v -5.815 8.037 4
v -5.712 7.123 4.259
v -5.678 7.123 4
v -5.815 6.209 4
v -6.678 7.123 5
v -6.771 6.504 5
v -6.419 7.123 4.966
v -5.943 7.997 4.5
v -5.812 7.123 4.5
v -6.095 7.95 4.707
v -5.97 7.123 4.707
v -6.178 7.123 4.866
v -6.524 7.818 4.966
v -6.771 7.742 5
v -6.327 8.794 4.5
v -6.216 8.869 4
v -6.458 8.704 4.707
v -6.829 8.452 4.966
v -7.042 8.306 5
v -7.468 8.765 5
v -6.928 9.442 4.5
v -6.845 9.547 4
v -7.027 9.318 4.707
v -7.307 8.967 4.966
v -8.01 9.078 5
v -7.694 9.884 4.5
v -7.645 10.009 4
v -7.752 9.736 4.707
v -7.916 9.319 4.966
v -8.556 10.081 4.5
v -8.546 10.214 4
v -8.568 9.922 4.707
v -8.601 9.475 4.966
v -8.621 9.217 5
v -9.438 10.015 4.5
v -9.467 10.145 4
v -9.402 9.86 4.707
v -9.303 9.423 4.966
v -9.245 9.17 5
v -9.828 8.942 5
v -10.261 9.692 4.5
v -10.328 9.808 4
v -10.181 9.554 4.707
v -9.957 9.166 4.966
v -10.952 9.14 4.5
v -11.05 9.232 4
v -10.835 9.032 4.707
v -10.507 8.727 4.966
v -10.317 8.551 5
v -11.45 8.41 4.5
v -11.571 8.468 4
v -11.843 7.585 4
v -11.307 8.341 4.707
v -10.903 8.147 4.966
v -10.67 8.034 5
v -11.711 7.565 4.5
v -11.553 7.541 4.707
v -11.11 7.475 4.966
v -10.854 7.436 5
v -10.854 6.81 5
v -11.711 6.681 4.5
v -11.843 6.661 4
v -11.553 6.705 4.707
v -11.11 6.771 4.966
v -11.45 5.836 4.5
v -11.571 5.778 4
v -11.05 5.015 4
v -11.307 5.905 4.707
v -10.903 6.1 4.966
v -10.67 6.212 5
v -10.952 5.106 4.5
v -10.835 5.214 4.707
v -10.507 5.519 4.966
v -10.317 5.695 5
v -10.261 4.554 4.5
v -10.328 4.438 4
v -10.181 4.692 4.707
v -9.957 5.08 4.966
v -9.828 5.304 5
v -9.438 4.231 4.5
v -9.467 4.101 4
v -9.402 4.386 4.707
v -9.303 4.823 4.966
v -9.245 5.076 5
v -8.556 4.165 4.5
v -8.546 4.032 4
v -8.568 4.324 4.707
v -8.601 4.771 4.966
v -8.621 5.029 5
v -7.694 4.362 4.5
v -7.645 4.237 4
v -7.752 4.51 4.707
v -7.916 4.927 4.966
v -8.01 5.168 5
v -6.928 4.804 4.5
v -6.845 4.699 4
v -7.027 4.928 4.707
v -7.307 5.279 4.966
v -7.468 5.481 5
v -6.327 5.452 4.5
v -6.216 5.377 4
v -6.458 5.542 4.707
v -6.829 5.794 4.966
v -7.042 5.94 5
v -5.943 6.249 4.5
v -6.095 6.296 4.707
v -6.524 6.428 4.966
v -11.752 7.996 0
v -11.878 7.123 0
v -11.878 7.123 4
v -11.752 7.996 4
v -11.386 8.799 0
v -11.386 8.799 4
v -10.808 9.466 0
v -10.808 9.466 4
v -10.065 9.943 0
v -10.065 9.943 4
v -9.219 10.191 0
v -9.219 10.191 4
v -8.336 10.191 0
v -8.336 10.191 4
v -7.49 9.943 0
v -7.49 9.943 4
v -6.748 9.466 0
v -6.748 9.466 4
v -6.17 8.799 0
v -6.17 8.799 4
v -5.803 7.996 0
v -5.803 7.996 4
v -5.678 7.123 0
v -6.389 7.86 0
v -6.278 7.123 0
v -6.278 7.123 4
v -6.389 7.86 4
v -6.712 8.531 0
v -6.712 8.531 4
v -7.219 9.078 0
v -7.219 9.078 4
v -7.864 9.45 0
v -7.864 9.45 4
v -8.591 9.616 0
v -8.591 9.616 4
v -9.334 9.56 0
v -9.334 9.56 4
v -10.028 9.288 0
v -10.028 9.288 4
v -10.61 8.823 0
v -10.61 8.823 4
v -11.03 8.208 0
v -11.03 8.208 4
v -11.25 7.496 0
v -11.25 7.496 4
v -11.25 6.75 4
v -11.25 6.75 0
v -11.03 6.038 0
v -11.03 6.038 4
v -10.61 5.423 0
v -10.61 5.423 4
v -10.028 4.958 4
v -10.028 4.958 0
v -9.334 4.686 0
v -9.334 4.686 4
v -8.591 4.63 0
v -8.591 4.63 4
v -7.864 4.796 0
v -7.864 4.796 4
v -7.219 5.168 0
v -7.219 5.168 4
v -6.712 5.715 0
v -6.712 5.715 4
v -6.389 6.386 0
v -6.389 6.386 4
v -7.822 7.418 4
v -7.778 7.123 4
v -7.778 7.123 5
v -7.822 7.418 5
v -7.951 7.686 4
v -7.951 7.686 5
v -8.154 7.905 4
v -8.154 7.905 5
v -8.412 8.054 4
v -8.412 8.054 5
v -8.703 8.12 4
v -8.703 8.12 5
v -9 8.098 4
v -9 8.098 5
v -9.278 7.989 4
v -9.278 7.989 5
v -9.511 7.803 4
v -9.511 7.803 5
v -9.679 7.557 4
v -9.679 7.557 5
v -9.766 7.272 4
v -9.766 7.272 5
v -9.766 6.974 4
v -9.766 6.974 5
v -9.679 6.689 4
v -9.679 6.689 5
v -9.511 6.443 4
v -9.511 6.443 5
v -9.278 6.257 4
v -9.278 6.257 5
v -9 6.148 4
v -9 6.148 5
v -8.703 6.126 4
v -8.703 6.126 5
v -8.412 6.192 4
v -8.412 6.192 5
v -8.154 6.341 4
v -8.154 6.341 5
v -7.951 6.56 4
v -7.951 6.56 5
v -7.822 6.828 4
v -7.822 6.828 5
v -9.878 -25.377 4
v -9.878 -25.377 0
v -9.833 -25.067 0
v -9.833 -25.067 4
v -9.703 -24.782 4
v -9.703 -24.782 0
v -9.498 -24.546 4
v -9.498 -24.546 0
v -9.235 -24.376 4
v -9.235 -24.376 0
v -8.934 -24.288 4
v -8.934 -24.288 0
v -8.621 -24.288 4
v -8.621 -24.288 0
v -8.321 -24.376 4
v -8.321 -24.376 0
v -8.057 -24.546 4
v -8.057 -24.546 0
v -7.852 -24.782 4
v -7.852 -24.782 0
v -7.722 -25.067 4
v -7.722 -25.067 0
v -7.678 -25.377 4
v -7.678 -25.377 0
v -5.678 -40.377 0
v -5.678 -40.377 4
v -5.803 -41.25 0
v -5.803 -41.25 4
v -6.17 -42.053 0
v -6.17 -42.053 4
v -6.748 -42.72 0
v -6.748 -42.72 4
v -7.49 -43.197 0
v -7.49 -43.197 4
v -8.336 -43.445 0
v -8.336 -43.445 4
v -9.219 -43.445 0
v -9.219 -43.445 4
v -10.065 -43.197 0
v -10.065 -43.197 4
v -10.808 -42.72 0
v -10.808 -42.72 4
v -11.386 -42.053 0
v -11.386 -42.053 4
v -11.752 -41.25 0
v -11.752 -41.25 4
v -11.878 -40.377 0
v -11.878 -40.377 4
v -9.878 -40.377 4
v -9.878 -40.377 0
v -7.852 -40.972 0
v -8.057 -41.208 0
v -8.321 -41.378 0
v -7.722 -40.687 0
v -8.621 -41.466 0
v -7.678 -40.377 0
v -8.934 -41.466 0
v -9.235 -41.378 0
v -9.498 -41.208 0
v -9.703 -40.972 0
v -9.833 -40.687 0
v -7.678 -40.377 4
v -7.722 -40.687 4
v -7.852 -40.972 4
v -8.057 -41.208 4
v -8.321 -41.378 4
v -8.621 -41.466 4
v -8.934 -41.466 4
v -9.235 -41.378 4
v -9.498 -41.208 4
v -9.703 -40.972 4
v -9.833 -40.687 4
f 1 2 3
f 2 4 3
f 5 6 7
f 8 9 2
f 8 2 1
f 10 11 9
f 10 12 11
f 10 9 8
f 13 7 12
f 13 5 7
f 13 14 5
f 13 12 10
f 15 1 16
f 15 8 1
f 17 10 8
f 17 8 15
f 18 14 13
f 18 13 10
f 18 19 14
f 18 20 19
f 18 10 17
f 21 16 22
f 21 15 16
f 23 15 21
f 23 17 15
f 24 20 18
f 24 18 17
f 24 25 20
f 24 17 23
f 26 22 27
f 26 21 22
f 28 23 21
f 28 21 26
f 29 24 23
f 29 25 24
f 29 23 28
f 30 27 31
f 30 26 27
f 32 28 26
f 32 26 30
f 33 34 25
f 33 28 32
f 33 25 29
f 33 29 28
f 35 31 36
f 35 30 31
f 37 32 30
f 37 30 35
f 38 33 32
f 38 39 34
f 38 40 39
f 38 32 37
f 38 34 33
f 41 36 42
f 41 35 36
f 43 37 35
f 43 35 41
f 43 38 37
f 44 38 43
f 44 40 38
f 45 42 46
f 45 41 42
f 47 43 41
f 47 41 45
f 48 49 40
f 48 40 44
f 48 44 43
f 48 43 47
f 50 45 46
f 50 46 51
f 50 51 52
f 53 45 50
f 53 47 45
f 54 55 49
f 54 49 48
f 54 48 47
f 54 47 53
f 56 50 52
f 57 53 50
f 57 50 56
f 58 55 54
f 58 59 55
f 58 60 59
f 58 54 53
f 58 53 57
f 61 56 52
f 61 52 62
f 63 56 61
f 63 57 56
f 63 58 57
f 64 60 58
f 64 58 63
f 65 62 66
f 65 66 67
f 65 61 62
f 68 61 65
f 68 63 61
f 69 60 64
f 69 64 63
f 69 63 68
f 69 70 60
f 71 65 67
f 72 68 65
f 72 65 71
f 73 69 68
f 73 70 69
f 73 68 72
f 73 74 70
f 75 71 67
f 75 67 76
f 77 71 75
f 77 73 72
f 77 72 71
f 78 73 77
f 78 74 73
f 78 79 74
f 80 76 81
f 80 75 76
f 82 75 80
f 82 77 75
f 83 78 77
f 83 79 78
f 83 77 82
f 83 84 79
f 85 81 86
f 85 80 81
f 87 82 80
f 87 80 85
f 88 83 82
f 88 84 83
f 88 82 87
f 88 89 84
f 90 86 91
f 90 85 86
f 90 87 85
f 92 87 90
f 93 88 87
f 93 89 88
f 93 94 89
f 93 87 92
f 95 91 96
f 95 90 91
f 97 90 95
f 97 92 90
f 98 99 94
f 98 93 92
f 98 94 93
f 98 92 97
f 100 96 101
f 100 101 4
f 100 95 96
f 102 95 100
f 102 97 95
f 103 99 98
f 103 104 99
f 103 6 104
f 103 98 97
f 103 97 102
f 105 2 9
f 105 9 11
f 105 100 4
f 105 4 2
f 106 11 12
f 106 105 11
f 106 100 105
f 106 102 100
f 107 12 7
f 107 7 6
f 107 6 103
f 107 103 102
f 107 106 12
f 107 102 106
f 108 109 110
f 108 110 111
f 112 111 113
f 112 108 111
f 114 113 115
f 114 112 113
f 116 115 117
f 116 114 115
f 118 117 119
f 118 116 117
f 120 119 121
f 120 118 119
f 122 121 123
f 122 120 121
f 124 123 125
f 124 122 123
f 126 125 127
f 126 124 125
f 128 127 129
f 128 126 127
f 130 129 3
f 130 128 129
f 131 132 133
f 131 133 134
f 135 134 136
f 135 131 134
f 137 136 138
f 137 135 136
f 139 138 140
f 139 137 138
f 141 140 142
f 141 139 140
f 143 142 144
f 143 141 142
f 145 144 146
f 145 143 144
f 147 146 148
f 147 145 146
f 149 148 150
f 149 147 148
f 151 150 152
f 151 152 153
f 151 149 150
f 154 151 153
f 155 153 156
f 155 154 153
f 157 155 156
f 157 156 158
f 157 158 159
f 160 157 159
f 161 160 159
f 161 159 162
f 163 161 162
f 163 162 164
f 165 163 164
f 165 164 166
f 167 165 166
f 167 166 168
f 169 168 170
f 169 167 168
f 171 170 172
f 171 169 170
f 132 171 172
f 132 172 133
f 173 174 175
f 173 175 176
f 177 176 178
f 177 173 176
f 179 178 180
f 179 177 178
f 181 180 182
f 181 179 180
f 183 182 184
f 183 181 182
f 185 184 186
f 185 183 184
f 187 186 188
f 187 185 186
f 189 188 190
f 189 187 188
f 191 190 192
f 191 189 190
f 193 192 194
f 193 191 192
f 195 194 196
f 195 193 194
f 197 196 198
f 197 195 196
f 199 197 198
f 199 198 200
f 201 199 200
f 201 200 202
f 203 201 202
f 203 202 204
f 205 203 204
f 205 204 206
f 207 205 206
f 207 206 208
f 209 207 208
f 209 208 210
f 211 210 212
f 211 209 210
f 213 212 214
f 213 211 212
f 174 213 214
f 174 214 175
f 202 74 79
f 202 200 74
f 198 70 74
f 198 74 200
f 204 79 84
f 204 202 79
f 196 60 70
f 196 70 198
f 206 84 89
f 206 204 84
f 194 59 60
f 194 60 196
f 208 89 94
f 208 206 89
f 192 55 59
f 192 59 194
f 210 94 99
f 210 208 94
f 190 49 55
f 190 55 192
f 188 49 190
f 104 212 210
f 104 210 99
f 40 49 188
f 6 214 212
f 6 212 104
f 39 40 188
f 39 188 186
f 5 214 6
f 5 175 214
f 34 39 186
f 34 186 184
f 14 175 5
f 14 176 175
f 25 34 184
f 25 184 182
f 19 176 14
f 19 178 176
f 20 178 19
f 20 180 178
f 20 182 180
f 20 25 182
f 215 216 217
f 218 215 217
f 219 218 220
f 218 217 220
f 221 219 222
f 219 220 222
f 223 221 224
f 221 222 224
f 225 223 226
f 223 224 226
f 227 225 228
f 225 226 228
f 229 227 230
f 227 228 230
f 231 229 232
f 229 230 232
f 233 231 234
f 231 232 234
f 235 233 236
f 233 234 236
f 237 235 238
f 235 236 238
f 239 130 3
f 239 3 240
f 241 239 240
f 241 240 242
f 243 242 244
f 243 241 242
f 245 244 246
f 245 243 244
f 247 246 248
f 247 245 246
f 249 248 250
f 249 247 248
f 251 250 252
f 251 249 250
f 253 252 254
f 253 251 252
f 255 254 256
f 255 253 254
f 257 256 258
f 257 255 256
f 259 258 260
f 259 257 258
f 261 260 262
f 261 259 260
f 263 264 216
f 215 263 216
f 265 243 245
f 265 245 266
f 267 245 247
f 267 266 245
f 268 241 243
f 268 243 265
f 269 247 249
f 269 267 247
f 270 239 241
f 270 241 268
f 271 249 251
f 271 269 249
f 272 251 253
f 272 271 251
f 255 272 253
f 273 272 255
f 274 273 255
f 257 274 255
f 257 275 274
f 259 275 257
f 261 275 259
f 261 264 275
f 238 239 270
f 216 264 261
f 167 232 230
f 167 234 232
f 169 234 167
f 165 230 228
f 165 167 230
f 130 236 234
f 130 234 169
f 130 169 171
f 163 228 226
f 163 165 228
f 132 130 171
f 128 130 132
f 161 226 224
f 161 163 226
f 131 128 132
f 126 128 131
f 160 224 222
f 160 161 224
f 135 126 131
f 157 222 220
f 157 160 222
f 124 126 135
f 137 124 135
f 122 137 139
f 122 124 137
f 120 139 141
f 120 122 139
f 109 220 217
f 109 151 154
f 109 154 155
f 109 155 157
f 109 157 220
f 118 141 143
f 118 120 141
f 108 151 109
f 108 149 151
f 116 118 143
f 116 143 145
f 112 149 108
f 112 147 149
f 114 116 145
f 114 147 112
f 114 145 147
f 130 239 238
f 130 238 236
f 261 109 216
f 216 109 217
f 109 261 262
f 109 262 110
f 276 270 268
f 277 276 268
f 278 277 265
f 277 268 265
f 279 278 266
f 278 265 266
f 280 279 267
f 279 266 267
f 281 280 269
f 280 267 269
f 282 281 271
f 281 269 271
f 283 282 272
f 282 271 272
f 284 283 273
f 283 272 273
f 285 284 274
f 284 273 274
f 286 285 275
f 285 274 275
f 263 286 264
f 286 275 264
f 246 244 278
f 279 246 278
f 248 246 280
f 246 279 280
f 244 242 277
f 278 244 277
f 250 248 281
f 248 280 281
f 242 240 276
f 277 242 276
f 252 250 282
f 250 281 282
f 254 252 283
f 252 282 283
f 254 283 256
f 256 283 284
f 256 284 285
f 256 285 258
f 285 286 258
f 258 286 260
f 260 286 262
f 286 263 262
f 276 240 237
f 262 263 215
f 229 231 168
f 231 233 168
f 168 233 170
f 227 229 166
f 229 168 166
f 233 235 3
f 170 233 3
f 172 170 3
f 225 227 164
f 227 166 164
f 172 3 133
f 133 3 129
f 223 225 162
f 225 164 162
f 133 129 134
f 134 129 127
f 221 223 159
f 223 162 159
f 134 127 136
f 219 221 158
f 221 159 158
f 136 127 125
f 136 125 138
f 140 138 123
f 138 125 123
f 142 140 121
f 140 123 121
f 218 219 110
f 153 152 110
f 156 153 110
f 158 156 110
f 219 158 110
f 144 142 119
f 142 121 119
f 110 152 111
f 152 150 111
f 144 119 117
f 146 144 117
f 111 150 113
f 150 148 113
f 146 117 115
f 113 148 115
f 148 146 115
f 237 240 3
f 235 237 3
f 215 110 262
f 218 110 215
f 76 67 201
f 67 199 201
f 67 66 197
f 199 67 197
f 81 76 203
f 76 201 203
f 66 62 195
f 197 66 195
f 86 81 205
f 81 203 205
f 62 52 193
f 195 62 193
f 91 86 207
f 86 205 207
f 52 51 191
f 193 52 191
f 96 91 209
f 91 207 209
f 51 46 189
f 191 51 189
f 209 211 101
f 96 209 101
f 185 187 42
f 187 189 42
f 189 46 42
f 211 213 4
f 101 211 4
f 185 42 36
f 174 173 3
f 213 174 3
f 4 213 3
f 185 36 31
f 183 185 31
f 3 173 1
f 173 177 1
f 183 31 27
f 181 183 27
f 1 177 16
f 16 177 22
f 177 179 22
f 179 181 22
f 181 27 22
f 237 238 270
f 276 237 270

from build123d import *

# Parameters (mm, degrees)
SKETCH1_R           = 2.5
BOSS_EXTRUDE1_DEPTH = 4
SKETCH2_R           = 3.1
SKETCH2_R_2         = 1
BOSS_EXTRUDE2_DEPTH = 1
FILLET1_R           = 1


with BuildPart() as part:
    # Sketch1 → Boss-Extrude1 (new body)
    with BuildSketch(Plane.XY):
        with BuildLine():
            Line((-5.677617002, 7.123043478), (-5.677617002, -40.376956522))
            ThreePointArc((-5.677617002, -40.376956522), (-8.777617002, -43.476956522), (-11.877617002, -40.376956522))
            Line((-11.877617002, -40.376956522), (-11.877617002, 7.123043478))
            ThreePointArc((-11.877617002, 7.123043478), (-8.777617002, 10.223043478), (-5.677617002, 7.123043478))
        make_face()
        with Locations((-8.777617002, 7.123043478)):
            Circle(SKETCH1_R, mode=Mode.SUBTRACT)
        with BuildLine():
            Line((-7.677617002, -25.376956522), (-7.677617002, -40.376956522))
            ThreePointArc((-7.677617002, -40.376956522), (-8.777617002, -41.476956522), (-9.877617002, -40.376956522))
            Line((-9.877617002, -40.376956522), (-9.877617002, -25.376956522))
            ThreePointArc((-9.877617002, -25.376956522), (-8.777617002, -24.276956522), (-7.677617002, -25.376956522))
        make_face(mode=Mode.SUBTRACT)
    extrude(amount=BOSS_EXTRUDE1_DEPTH)


with BuildPart() as body_2:
    # Sketch2 → Boss-Extrude2 (new body)
    with BuildSketch(Plane.XY.offset(4)):
        with Locations((-8.777617002, 7.123043478)):
            Circle(SKETCH2_R)
        with Locations((-8.777617002, 7.123043478)):
            Circle(SKETCH2_R_2, mode=Mode.SUBTRACT)
    extrude(amount=BOSS_EXTRUDE2_DEPTH)

    # Fillet1
    fillet1_edges = [body_2.edges().sort_by_distance(p)[0] for p in [
        (-11.877617002, 7.123043478, 5),
    ]]
    fillet(fillet1_edges, radius=FILLET1_R - 0.0001)  # a hair under: the kernel refuses the full size


solid = Compound([part.part, body_2.part])
